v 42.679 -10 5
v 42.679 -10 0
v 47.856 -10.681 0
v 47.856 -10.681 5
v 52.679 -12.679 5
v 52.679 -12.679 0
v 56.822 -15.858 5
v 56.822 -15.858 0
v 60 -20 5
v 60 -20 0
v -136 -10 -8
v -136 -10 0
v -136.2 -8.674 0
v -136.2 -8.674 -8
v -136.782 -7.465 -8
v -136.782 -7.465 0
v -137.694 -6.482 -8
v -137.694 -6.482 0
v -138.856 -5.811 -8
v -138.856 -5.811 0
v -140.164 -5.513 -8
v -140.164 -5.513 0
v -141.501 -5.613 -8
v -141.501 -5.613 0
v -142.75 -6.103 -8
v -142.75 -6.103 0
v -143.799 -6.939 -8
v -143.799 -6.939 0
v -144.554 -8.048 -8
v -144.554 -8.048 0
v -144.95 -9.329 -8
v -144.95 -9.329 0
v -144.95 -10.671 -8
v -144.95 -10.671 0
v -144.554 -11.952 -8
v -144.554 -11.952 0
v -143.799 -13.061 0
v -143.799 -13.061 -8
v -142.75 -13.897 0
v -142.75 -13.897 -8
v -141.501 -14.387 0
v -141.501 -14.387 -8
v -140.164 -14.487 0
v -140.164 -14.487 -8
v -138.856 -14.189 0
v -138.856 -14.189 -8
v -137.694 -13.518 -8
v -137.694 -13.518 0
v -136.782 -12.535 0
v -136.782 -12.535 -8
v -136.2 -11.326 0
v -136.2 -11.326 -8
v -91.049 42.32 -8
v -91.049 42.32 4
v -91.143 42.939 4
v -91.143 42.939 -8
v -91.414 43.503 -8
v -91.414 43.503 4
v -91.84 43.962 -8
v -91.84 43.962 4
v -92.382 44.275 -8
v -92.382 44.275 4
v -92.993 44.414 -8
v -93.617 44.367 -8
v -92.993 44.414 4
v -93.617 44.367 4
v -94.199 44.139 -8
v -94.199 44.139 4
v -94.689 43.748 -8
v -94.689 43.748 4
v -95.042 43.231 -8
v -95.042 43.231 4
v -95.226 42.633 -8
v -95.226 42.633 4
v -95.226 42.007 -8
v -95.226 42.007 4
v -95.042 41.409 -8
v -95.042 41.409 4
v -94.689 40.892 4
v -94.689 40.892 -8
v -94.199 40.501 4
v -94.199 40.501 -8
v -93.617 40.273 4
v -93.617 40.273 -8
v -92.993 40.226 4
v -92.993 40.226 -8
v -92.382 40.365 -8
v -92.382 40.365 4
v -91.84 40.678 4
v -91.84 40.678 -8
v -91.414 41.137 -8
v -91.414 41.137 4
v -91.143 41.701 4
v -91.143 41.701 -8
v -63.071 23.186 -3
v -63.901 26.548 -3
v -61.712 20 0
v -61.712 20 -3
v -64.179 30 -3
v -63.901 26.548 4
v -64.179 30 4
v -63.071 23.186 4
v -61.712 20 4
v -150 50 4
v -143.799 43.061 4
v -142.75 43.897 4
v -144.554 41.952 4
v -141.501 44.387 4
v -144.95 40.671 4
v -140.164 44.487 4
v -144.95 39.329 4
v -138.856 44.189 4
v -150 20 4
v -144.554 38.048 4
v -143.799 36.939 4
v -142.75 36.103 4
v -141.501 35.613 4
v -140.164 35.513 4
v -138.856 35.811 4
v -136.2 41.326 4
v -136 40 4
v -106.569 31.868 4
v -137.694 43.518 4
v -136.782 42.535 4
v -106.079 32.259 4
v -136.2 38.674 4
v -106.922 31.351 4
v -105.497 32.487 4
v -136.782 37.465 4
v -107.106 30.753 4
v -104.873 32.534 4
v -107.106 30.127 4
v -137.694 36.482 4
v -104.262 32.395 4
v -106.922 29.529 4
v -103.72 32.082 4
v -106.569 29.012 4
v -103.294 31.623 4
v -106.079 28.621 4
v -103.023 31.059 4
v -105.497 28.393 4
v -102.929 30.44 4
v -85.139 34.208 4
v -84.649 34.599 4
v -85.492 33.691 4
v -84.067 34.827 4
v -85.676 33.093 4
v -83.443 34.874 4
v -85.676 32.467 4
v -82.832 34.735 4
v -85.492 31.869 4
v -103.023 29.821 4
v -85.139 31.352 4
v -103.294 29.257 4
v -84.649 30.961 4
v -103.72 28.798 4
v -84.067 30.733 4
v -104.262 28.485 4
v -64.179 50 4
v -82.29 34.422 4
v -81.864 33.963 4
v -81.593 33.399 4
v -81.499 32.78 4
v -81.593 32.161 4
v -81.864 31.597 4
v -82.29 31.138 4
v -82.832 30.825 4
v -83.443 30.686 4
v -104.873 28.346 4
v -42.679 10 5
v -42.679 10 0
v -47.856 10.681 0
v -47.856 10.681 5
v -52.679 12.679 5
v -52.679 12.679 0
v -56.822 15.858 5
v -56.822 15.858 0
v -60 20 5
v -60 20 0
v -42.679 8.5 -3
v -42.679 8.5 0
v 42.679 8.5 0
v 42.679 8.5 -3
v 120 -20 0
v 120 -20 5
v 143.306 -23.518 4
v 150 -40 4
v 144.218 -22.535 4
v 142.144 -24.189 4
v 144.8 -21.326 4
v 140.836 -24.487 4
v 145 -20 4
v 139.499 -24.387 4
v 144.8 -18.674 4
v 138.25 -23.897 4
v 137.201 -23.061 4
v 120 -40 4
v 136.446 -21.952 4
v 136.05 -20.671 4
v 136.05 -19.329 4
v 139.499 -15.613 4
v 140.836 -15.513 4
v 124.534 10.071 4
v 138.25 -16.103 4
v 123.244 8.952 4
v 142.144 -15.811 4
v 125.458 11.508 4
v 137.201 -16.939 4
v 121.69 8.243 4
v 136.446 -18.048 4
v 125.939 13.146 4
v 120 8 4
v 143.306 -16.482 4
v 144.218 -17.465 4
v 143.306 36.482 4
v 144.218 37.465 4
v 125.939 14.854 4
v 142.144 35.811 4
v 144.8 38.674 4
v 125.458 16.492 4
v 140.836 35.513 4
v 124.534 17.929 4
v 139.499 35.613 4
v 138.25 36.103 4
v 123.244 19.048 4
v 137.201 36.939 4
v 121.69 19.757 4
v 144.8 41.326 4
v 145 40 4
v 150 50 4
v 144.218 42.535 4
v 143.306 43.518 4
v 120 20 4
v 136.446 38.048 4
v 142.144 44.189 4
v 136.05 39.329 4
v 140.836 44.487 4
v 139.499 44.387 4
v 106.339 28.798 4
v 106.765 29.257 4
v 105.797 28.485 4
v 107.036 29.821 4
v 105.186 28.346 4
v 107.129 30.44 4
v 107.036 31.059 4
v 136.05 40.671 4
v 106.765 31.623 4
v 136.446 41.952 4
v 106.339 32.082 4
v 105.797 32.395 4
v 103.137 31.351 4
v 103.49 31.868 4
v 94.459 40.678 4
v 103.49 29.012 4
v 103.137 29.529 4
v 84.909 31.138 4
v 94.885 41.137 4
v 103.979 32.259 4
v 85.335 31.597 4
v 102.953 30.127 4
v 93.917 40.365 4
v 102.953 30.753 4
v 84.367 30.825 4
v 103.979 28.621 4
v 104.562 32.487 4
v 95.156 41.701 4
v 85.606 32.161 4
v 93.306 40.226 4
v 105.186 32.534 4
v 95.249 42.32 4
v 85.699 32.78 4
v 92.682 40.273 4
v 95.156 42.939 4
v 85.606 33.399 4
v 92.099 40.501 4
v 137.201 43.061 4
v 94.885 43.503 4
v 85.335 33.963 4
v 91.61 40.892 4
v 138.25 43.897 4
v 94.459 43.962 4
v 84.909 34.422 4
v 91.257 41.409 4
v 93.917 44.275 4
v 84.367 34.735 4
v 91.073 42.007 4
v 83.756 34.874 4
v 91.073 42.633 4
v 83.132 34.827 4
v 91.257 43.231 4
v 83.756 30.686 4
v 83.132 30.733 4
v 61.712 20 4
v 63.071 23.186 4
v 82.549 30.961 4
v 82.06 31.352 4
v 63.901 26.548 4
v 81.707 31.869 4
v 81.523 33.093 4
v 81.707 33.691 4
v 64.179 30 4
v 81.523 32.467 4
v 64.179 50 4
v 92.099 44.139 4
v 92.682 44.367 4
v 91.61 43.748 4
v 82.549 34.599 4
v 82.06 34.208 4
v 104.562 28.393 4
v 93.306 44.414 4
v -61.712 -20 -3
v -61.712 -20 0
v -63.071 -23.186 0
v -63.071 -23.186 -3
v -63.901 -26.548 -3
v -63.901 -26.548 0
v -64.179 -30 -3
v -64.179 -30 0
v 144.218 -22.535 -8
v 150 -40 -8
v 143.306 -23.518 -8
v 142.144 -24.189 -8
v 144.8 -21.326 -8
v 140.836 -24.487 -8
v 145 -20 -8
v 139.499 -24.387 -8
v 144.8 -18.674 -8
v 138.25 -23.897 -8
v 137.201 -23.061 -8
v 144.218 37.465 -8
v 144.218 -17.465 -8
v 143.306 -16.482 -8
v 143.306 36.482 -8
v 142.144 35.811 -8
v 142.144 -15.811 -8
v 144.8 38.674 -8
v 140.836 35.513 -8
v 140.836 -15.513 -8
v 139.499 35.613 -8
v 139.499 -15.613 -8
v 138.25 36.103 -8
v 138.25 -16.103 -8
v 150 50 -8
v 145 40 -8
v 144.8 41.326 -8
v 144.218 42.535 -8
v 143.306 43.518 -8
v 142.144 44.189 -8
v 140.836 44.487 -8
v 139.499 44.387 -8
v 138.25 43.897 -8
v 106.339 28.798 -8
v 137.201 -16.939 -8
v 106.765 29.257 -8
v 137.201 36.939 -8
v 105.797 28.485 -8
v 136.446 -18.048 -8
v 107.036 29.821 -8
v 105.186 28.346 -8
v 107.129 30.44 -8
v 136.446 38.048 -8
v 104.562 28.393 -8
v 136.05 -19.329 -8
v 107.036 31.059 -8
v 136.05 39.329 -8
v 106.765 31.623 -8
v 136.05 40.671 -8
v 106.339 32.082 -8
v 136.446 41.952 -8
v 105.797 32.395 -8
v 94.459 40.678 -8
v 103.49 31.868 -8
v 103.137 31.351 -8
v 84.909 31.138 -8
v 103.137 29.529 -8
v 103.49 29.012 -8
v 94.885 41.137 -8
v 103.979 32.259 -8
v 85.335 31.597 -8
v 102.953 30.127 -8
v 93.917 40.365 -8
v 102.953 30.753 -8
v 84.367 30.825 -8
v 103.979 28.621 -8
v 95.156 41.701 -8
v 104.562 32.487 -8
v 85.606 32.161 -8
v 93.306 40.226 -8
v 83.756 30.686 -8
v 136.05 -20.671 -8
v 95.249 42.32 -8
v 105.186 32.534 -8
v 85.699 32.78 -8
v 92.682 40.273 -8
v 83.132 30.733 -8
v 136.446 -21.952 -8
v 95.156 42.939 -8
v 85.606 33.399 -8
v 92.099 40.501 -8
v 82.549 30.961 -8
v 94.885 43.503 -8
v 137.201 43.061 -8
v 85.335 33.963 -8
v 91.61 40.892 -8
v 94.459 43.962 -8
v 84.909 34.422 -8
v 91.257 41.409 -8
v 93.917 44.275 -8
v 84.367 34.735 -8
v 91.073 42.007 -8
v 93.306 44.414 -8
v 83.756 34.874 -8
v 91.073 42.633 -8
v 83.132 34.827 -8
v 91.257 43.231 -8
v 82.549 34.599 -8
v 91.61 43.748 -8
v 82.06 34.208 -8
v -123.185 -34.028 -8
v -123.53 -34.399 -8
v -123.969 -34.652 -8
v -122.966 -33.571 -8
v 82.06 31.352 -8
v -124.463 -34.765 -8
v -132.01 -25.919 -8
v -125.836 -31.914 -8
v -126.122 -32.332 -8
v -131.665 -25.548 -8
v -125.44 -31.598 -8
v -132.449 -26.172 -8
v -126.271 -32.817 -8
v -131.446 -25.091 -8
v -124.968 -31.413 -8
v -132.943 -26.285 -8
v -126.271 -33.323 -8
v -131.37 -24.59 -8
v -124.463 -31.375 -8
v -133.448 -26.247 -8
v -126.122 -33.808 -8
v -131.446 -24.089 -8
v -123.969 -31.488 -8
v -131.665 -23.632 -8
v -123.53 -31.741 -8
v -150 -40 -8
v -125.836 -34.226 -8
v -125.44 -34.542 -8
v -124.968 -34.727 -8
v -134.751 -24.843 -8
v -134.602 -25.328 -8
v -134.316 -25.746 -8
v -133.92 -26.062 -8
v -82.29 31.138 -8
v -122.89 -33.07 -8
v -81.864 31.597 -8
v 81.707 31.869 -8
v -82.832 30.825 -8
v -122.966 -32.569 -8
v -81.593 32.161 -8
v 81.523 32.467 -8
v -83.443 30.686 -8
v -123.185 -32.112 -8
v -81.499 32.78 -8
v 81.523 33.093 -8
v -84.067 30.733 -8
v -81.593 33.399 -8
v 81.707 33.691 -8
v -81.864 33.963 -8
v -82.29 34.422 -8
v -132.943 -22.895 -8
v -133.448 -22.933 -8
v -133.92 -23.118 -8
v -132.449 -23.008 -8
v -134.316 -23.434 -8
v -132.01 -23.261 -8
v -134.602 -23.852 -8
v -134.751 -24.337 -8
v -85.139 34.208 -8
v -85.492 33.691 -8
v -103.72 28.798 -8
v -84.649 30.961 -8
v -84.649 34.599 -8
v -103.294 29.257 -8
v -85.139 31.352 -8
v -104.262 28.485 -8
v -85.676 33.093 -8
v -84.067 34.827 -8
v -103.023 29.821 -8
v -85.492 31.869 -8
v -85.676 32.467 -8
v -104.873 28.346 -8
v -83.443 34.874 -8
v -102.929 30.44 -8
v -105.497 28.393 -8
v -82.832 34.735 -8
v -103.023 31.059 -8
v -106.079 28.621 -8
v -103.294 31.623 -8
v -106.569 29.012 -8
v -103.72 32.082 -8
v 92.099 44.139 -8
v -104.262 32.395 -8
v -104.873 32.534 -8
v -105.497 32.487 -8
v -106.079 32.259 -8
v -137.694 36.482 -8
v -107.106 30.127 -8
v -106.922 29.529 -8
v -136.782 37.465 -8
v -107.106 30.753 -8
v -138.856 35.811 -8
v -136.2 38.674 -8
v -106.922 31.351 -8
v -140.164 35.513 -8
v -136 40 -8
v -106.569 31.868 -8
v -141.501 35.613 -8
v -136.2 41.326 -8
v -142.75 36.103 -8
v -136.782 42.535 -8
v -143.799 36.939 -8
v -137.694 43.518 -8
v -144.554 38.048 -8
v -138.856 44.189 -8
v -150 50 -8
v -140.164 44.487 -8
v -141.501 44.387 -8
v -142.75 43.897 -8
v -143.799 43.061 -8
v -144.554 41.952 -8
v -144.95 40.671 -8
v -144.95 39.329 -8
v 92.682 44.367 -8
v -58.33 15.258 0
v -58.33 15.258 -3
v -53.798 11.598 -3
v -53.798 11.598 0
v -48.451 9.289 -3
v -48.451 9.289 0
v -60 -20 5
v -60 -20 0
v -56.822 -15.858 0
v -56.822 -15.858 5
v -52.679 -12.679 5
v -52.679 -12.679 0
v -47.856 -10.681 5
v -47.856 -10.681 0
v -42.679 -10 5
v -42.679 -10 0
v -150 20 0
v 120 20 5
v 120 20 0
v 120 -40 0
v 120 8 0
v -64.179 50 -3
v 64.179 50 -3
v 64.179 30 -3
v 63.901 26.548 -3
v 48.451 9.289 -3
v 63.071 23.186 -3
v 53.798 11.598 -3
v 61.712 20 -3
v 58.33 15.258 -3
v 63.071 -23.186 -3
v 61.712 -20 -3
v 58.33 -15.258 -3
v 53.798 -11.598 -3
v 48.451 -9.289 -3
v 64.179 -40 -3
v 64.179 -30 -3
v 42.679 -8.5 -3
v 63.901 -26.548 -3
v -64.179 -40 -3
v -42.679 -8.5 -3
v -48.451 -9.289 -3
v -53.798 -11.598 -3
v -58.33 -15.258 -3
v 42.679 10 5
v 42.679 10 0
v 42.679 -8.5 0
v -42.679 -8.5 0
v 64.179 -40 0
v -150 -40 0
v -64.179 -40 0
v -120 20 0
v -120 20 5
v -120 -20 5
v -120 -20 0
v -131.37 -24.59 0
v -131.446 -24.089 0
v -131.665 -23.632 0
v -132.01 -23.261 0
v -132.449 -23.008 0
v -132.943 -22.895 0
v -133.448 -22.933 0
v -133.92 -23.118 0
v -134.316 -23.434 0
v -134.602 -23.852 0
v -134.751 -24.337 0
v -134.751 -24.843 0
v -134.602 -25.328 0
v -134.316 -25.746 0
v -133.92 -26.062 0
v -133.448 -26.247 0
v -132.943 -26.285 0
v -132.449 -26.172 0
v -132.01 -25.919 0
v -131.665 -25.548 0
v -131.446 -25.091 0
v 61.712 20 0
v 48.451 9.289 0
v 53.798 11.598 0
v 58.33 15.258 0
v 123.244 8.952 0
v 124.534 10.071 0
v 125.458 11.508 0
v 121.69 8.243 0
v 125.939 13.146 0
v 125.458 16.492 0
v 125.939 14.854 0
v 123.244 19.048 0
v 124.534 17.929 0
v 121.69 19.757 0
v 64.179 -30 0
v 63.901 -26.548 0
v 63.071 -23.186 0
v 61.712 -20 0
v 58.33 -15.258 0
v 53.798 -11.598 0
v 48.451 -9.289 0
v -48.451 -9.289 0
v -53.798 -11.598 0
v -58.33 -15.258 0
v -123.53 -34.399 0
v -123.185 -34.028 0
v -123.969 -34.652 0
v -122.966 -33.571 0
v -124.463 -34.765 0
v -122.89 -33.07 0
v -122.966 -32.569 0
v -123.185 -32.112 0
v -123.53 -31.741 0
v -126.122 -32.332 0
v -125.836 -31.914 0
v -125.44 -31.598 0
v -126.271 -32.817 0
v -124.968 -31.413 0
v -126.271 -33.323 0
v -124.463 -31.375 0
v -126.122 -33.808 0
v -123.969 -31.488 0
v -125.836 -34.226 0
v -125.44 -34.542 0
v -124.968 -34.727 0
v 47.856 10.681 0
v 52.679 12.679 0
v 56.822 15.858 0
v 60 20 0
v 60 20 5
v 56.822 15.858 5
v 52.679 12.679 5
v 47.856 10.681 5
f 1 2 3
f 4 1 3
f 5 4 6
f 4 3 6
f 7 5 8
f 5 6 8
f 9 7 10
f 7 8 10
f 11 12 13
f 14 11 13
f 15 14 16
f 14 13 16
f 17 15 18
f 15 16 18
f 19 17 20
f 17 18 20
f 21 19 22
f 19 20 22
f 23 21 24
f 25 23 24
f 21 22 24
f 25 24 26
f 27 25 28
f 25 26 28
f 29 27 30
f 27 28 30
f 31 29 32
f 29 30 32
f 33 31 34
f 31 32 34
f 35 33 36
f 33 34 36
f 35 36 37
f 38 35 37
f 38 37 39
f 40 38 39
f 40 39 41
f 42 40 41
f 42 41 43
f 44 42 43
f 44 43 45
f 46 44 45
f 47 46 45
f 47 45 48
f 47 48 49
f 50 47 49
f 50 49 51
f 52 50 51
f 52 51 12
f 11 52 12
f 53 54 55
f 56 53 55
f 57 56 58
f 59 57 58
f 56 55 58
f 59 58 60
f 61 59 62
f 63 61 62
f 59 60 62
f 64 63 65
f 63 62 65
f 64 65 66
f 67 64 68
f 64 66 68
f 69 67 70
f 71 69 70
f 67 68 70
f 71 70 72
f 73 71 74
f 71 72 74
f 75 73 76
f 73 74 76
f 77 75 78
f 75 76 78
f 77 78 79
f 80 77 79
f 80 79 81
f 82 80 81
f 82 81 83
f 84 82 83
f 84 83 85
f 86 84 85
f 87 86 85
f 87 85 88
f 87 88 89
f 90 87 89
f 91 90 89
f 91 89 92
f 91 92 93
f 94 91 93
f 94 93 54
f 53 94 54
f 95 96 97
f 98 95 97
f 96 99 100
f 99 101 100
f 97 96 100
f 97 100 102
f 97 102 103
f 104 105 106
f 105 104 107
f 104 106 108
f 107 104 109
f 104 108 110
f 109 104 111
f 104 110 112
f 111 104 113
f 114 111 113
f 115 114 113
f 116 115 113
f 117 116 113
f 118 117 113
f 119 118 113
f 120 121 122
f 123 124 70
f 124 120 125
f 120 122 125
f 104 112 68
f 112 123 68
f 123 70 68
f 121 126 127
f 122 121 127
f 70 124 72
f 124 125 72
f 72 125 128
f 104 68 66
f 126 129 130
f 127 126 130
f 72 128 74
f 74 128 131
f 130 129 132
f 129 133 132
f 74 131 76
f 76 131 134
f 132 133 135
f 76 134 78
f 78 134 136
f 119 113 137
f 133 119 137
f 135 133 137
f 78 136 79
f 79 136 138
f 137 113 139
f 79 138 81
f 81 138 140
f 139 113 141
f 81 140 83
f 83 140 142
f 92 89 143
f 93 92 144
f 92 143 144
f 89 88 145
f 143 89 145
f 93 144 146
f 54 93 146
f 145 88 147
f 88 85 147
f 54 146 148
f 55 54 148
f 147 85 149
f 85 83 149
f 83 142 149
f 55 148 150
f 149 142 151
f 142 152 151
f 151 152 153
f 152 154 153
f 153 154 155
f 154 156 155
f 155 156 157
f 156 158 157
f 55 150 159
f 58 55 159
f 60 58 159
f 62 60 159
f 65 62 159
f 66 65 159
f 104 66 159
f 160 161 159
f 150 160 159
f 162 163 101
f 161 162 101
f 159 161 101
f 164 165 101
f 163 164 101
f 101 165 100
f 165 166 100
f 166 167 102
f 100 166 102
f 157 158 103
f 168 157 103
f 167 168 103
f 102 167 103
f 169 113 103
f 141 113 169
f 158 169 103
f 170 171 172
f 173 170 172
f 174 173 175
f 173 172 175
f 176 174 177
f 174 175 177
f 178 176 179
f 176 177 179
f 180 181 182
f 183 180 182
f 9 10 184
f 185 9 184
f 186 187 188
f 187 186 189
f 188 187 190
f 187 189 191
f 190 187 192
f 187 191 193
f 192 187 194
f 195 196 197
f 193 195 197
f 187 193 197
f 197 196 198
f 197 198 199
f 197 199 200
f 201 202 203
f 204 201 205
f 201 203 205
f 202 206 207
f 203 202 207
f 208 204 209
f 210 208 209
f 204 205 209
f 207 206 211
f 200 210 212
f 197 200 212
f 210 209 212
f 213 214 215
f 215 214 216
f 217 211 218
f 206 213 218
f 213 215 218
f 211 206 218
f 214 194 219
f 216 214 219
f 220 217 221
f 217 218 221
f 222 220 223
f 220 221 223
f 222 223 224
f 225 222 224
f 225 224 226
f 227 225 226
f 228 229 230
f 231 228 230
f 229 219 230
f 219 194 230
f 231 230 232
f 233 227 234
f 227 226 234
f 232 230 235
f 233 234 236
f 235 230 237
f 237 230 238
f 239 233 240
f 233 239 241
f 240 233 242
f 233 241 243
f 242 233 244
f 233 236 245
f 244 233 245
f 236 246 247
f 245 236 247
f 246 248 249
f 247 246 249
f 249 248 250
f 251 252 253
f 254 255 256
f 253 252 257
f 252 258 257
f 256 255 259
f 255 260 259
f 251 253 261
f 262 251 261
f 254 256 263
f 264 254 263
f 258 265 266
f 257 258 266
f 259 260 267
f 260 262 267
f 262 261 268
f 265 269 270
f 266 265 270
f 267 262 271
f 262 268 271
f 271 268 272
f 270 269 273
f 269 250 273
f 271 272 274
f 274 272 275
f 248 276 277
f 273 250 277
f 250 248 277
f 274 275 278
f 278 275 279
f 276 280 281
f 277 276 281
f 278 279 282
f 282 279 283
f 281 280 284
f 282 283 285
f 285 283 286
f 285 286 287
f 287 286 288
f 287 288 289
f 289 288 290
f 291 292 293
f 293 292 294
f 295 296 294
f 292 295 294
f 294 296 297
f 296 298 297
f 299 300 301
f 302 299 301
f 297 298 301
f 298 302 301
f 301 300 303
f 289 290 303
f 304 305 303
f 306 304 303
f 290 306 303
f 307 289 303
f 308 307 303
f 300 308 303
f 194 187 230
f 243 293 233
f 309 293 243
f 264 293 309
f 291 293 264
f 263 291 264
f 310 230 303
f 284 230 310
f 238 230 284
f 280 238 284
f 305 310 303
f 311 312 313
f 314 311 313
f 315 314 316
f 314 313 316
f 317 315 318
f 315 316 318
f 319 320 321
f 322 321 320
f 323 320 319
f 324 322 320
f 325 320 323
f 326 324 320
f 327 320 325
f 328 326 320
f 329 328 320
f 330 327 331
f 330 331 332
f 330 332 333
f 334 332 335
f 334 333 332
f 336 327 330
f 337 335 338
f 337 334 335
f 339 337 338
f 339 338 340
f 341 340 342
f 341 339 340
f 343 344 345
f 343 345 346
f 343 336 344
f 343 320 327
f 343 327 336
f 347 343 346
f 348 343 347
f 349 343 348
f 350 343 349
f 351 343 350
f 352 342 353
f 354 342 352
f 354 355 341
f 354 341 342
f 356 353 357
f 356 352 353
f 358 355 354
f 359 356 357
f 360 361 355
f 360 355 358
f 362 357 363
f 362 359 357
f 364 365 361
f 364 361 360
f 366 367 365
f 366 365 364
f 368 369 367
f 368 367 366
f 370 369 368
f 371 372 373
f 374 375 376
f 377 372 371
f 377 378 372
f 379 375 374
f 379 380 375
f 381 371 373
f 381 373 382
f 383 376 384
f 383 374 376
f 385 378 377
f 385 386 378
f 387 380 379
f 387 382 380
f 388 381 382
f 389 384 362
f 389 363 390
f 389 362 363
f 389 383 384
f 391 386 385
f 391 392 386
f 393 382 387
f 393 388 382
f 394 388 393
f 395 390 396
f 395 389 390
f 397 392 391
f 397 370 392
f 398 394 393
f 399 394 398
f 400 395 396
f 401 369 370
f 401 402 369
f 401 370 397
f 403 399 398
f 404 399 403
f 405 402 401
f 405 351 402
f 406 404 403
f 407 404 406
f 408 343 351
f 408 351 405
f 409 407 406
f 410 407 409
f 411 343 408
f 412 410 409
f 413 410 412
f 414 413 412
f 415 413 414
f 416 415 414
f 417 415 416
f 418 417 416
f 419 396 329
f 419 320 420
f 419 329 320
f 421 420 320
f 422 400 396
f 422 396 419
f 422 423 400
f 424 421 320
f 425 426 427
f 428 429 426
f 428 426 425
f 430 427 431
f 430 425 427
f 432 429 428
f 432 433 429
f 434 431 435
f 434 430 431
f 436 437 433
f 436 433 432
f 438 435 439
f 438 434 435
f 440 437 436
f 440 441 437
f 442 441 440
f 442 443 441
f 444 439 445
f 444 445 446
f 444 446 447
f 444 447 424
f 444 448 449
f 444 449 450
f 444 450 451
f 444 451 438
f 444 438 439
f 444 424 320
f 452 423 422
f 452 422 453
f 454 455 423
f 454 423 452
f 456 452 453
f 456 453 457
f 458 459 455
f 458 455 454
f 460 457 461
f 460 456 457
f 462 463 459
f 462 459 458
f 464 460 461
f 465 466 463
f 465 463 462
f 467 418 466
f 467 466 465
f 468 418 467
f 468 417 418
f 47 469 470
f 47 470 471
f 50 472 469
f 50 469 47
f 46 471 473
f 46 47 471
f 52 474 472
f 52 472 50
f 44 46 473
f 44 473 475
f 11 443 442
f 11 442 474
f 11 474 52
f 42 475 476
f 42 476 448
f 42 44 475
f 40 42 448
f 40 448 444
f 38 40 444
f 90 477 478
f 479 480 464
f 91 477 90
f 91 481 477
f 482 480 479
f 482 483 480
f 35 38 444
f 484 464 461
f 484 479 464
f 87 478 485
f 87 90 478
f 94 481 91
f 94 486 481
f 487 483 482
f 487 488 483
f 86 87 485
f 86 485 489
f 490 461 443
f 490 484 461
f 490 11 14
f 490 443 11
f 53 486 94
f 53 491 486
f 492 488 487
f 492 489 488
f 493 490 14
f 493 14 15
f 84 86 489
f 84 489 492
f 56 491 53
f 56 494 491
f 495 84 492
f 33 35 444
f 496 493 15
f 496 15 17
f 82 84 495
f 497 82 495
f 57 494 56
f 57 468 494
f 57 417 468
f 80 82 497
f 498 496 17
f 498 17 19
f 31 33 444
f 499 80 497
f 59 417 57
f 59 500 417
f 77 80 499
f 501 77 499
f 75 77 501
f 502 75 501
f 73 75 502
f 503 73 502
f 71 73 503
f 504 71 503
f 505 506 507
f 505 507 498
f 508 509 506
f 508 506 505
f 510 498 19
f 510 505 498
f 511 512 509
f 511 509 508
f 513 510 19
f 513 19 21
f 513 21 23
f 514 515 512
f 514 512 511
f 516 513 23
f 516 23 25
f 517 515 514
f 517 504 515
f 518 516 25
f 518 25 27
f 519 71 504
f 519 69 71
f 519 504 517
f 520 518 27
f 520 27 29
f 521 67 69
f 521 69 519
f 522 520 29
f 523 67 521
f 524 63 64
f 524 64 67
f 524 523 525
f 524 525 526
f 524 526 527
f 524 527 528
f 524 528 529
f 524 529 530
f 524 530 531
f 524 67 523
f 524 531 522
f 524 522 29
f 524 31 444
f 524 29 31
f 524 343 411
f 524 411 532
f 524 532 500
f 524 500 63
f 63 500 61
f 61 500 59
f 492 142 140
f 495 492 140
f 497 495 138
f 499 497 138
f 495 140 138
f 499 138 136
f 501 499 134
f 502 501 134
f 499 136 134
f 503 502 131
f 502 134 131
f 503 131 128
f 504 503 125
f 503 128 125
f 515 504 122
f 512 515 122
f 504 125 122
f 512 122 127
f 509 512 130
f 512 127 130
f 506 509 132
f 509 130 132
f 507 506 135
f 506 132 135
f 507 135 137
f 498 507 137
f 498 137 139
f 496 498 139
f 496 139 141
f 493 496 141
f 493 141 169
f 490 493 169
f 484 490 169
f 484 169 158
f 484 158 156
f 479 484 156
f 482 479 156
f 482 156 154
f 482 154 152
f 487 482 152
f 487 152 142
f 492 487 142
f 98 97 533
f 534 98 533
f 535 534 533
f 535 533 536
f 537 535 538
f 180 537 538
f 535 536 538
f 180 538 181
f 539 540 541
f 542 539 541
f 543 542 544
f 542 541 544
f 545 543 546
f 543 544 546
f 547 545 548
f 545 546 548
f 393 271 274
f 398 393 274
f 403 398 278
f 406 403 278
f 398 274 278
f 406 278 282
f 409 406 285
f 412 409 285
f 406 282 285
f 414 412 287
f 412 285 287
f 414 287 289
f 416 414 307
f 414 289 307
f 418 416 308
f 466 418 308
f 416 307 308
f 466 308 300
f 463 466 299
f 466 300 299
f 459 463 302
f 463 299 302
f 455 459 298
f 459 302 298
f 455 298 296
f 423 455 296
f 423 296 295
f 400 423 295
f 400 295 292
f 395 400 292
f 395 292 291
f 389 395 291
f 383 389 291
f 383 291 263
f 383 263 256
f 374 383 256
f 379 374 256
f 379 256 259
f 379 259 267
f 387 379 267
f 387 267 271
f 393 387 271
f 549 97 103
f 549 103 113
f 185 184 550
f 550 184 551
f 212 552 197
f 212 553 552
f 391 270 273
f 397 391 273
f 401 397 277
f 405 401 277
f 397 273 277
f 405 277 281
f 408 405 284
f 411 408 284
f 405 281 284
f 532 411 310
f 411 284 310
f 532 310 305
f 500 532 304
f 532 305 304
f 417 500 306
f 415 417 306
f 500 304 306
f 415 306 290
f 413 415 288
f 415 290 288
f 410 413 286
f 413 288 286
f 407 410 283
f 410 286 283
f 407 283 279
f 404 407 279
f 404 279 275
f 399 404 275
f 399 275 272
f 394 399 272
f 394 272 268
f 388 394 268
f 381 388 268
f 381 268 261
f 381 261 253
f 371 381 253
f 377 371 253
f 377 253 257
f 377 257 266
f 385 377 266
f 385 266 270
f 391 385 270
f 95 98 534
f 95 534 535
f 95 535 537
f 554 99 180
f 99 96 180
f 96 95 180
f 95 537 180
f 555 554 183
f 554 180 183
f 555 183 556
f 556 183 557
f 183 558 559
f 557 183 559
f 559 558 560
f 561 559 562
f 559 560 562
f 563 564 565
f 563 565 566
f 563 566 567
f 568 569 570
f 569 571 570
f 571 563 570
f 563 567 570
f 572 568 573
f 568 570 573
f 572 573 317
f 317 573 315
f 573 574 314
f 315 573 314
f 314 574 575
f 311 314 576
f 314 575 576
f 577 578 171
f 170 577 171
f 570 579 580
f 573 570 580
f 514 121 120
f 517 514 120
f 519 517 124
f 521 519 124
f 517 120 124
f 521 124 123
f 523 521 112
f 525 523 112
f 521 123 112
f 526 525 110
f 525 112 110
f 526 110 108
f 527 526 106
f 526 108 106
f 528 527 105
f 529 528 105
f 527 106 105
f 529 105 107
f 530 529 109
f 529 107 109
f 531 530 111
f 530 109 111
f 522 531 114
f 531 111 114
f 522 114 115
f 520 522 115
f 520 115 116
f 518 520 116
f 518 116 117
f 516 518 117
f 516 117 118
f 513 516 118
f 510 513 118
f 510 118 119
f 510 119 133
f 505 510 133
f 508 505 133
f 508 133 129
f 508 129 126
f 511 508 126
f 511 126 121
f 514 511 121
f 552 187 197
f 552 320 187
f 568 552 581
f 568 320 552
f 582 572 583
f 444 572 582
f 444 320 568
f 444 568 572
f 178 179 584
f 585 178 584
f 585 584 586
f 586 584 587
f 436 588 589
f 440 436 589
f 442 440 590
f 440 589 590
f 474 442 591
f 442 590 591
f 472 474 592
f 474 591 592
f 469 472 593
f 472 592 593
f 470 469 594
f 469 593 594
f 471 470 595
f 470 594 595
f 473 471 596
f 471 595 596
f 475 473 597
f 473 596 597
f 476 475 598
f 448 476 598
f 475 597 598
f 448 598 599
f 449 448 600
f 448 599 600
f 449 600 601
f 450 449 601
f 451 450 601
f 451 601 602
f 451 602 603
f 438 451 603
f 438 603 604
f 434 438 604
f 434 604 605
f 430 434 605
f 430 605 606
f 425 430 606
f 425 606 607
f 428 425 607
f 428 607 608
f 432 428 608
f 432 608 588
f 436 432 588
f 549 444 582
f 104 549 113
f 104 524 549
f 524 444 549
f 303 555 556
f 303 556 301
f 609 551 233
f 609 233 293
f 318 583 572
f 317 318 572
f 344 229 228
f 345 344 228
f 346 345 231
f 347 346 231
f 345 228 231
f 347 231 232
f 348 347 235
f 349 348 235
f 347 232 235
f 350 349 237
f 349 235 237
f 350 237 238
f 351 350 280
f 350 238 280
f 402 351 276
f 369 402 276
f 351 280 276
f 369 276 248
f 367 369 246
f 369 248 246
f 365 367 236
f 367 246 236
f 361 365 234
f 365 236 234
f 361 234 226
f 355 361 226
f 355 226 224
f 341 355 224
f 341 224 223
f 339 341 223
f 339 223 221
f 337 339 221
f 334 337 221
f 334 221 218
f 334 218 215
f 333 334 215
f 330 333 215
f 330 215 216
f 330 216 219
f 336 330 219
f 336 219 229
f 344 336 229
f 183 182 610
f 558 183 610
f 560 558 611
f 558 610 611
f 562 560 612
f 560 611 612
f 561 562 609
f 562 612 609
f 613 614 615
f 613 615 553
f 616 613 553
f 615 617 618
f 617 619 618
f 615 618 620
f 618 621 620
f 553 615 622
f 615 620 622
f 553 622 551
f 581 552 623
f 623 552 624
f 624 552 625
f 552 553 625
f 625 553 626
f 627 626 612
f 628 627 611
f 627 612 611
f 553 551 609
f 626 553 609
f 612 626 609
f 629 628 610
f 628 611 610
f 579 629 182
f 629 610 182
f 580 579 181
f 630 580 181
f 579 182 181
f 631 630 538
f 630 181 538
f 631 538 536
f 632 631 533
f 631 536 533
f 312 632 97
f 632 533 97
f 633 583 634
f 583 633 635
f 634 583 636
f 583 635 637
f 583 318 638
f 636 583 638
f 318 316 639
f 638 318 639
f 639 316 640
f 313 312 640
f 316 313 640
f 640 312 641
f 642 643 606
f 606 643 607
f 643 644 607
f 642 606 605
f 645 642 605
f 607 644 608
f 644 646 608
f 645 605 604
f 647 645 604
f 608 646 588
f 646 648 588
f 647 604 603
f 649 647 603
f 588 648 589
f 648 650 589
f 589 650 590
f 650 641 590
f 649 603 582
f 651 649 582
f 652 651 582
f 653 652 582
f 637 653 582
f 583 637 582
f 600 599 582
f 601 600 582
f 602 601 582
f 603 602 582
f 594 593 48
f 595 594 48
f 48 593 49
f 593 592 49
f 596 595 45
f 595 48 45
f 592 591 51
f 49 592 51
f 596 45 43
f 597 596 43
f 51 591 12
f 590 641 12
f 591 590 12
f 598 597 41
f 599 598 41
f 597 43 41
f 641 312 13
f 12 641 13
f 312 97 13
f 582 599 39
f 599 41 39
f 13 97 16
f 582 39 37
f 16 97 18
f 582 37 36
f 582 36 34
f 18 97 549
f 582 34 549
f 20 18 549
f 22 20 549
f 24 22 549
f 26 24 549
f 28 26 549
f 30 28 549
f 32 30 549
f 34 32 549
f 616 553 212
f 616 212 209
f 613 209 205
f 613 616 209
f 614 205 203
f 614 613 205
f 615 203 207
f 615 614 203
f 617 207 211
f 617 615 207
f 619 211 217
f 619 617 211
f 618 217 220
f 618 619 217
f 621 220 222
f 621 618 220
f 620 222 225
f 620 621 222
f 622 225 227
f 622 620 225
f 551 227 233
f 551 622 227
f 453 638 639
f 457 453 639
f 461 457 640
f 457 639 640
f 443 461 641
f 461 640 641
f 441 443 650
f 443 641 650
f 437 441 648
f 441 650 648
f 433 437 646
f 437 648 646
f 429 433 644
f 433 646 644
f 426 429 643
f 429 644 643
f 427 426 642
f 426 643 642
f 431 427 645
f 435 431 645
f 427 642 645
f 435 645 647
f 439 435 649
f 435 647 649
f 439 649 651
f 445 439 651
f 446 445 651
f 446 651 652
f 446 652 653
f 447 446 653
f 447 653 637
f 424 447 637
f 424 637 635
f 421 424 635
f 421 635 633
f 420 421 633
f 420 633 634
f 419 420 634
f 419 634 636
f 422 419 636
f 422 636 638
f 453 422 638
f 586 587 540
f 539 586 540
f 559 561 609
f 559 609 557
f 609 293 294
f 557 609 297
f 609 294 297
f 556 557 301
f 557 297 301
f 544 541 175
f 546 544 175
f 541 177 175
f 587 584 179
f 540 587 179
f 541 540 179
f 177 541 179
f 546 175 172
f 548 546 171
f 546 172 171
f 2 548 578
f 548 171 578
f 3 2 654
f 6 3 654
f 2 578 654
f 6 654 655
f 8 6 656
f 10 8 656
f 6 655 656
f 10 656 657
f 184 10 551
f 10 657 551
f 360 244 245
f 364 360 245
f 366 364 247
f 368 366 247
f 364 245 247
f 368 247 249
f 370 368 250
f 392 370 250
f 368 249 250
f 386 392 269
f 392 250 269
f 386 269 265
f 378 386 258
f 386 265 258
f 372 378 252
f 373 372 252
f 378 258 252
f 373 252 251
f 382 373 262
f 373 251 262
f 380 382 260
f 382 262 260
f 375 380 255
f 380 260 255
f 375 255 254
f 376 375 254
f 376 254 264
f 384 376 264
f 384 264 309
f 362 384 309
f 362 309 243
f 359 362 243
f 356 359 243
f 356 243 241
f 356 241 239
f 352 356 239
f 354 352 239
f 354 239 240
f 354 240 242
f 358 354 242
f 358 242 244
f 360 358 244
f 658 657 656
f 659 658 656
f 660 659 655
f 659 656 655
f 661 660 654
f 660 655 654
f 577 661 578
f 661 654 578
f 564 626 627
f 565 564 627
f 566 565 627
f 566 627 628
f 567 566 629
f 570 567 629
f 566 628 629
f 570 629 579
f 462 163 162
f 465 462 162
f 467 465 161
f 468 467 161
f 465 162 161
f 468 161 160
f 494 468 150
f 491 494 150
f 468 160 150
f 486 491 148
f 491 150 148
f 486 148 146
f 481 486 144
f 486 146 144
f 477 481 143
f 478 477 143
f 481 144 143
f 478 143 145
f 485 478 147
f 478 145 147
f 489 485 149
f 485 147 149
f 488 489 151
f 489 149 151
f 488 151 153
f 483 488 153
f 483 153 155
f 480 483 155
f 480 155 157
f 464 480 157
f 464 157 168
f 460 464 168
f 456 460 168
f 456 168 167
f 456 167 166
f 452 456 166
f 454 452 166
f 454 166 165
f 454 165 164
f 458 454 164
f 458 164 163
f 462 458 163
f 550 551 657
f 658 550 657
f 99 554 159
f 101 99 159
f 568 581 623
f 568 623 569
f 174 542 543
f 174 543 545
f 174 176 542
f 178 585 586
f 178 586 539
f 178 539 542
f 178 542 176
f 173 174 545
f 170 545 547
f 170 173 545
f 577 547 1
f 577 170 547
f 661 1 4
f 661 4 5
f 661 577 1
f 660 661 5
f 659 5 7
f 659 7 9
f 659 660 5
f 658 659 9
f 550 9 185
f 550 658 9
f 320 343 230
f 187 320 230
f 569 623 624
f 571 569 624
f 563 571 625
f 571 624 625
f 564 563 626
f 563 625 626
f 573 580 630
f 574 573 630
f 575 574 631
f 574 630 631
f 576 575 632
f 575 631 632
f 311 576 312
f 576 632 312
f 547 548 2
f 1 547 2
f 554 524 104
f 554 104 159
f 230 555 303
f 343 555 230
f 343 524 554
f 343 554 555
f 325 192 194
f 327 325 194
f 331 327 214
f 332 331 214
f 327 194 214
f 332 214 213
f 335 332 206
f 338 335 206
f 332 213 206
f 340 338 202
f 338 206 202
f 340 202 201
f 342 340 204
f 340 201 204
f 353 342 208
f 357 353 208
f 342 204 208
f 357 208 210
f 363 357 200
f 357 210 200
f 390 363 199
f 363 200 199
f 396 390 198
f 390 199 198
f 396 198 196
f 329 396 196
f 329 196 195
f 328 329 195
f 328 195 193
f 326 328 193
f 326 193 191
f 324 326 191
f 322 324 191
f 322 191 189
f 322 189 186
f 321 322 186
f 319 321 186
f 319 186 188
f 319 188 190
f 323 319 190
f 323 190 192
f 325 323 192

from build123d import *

# Parameters (mm, degrees)
F1_DEPTH  = 5
F3_DEPTH  = 3
F4_W      = 20
F4_H      = 60
F5_DEPTH  = 5
F6_DEPTH  = 4
F7_DEPTH  = 20
F8_R      = 2.1
F9_DEPTH  = 25
F10_R     = 4.5
F11_DEPTH = 25
F13_DEPTH = 10
F12_R     = 1.7
F14_DEPTH = 25


# Not quite as in the source:
# - a feature names something its author has since deleted; it is built from what else it names


with BuildPart() as f1:
    # F0 (on Top) → F1 (new body)
    with BuildSketch(Plane.XY):
        with BuildLine():
            Line((0, -10), (0, 0))
            Line((0, 0), (120, 0))
            Line((120, 0), (120, 20))
            Line((120, 20), (60, 20))
            ThreePointArc((60, 20), (52.6794919243, 12.6794919243), (42.6794919243, 10))
            Line((42.6794919243, 10), (0, 10))
            Line((0, 10), (-42.6794919243, 10))
            ThreePointArc((-42.6794919243, 10), (-52.6794919243, 12.6794919243), (-60, 20))
            Line((-60, 20), (-120, 20))
            Line((-120, 20), (-120, 0))
            Line((-120, 0), (-120, -20))
            Line((-120, -20), (-60, -20))
            ThreePointArc((-60, -20), (-52.6794919243, -12.6794919243), (-42.6794919243, -10))
            Line((-42.6794919243, -10), (0, -10))
        make_face()
        with BuildLine():
            Line((120, 0), (0, 0))
            Line((0, 0), (0, -10))
            Line((0, -10), (42.6794919243, -10))
            ThreePointArc((42.6794919243, -10), (52.6794919243, -12.6794919243), (60, -20))
            Line((60, -20), (120, -20))
            Line((120, -20), (120, 0))
        make_face()
    extrude(amount=F1_DEPTH)


with BuildPart() as f3:
    # F2 (on face) → F3 (new body)
    with BuildSketch(Plane(origin=(0, 0, 0), x_dir=(1, 0, 0), z_dir=(0, 0, -1))):
        with BuildLine():
            Line((120, 30), (64.1794919243, 30))
            ThreePointArc((64.1794919243, 30), (63.5535982007, 24.8500789171), (61.712358235, 20))
            Line((61.712358235, 20), (120, 20))
            Line((120, 20), (120, 30))
        make_face()
        with BuildLine():
            Line((120, 20), (61.712358235, 20))
            ThreePointArc((61.712358235, 20), (53.7981699033, 11.5982337804), (42.6794919243, 8.5))
            Line((42.6794919243, 8.5), (-42.6794919243, 8.5))
            ThreePointArc((-42.6794919243, 8.5), (-53.7981699033, 11.5982337804), (-61.712358235, 20))
            Line((-61.712358235, 20), (-120, 20))
            Line((-120, 20), (-120, -20))
            Line((-120, -20), (-61.712358235, -20))
            ThreePointArc((-61.712358235, -20), (-53.7981699033, -11.5982337804), (-42.6794919243, -8.5))
            Line((-42.6794919243, -8.5), (42.6794919243, -8.5))
            ThreePointArc((42.6794919243, -8.5), (53.7981699033, -11.5982337804), (61.712358235, -20))
            Line((61.712358235, -20), (120, -20))
            Line((120, -20), (120, -8))
            Line((120, -8), (120, 20))
        make_face()
        with BuildLine():
            ThreePointArc((-61.712358235, 20), (-63.5535982007, 24.8500789171), (-64.1794919243, 30))
            Line((-64.1794919243, 30), (-150, 30))
            Line((-150, 30), (-150, -20))
            Line((-150, -20), (-120, -20))
            Line((-120, -20), (-120, 20))
            Line((-120, 20), (-61.712358235, 20))
        make_face()
        with BuildLine():
            Line((-120, -20), (-150, -20))
            Line((-150, -20), (-150, -30))
            Line((-150, -30), (-64.1794919243, -30))
            ThreePointArc((-64.1794919243, -30), (-63.5535982007, -24.8500789171), (-61.712358235, -20))
            Line((-61.712358235, -20), (-120, -20))
        make_face()
        with BuildLine():
            Line((150, 30), (120, 30))
            Line((120, 30), (120, 20))
            Line((120, 20), (120, -8))
            ThreePointArc((120, -8), (126, -14), (120, -20))
            Line((120, -20), (61.712358235, -20))
            ThreePointArc((61.712358235, -20), (63.5535982007, -24.8500789171), (64.1794919243, -30))
            Line((64.1794919243, -30), (150, -30))
            Line((150, -30), (150, 30))
        make_face()
        with BuildLine():
            ThreePointArc((120, -20), (126, -14), (120, -8))
            Line((120, -8), (120, -20))
        make_face()
    extrude(amount=F3_DEPTH)

    # F4 (on face) → F5 (join)
    with BuildSketch(Plane(origin=(0, 0, -3), x_dir=(1, 0, 0), z_dir=(0, 0, -1))):
        with BuildLine():
            Line((64.1794919243, -30), (130, -30))
            Line((130, -30), (130, 30))
            Line((130, 30), (64.1794919243, 30))
            ThreePointArc((64.1794919243, 30), (57.8822877198, 14.7972042045), (42.6794919243, 8.5))
            Line((42.6794919243, 8.5), (-42.6794919243, 8.5))
            ThreePointArc((-42.6794919243, 8.5), (-57.8822877198, 14.7972042045), (-64.1794919243, 30))
            Line((-64.1794919243, 30), (-130, 30))
            Line((-130, 30), (-130, -30))
            Line((-130, -30), (-64.1794919243, -30))
            ThreePointArc((-64.1794919243, -30), (-57.8822877198, -14.7972042045), (-42.6794919243, -8.5))
            Line((-42.6794919243, -8.5), (42.6794919243, -8.5))
            ThreePointArc((42.6794919243, -8.5), (57.8822877198, -14.7972042045), (64.1794919243, -30))
        make_face()
        with BuildLine():
            ThreePointArc((42.6794919243, 8.5), (57.8822877198, 14.7972042045), (64.1794919243, 30))
            Line((64.1794919243, 30), (-64.1794919243, 30))
            ThreePointArc((-64.1794919243, 30), (-57.8822877198, 14.7972042045), (-42.6794919243, 8.5))
            Line((-42.6794919243, 8.5), (42.6794919243, 8.5))
        make_face()
        with BuildLine():
            Line((-64.1794919243, -30), (64.1794919243, -30))
            ThreePointArc((64.1794919243, -30), (57.8822877198, -14.7972042045), (42.6794919243, -8.5))
            Line((42.6794919243, -8.5), (-42.6794919243, -8.5))
            ThreePointArc((-42.6794919243, -8.5), (-57.8822877198, -14.7972042045), (-64.1794919243, -30))
        make_face()
        with Locations((-140, 0)):
            Rectangle(F4_W, F4_H)
        with Locations((140, 0)):
            Rectangle(F4_W, F4_H)
    extrude(amount=F5_DEPTH)

    # F2 (on face) → F6 (join)
    with BuildSketch(Plane(origin=(0, 0, 0), x_dir=(1, 0, 0), z_dir=(0, 0, -1))):
        with BuildLine():
            Line((150, 30), (120, 30))
            Line((120, 30), (120, 20))
            Line((120, 20), (120, -8))
            ThreePointArc((120, -8), (126, -14), (120, -20))
            Line((120, -20), (61.712358235, -20))
            ThreePointArc((61.712358235, -20), (63.5535982007, -24.8500789171), (64.1794919243, -30))
            Line((64.1794919243, -30), (150, -30))
            Line((150, -30), (150, 30))
        make_face()
        with BuildLine():
            Line((-120, -20), (-150, -20))
            Line((-150, -20), (-150, -30))
            Line((-150, -30), (-64.1794919243, -30))
            ThreePointArc((-64.1794919243, -30), (-63.5535982007, -24.8500789171), (-61.712358235, -20))
            Line((-61.712358235, -20), (-120, -20))
        make_face()
    extrude(amount=-F6_DEPTH)

    # F7 (add): a face of the model
    f7_faces = [f3.faces().sort_by_distance(p)[0] for p in [
        (67.1818909651, 30, 0.5),
    ]]
    extrude(f7_faces, amount=F7_DEPTH)

    # F8 (on face) → F9 (cut)
    with BuildSketch(Plane.XY.offset(4)):
        with Locations((-105.0294919243, 30.44)):
            Circle(F8_R)
        with Locations((-93.1494919243, 42.32)):
            Circle(F8_R)
        with Locations((-83.5994919243, 32.78)):
            Circle(F8_R)
        with Locations((83.5994919243, 32.78)):
            Circle(F8_R)
        with Locations((93.1494919243, 42.32)):
            Circle(F8_R)
        with Locations((105.0294919243, 30.44)):
            Circle(F8_R)
    extrude(amount=-F9_DEPTH, mode=Mode.SUBTRACT)

    # F10 (on face) → F11 (cut)
    with BuildSketch(Plane.XY.offset(5)):
        with Locations((-140.5, -10)):
            Circle(F10_R)
        with Locations((140.5, -20)):
            Circle(F10_R)
        with Locations((-140.5, 40)):
            Circle(F10_R)
        with Locations((140.5, 40)):
            Circle(F10_R)
    extrude(amount=-F11_DEPTH, mode=Mode.SUBTRACT)

    # F13 (add): a face of the model
    f13_faces = [f3.faces().sort_by_distance(p)[0] for p in [
        (7.5880955109, -30, -4.1136773426),
    ]]
    extrude(f13_faces, amount=F13_DEPTH)

    # F12 (on face) → F14 (cut)
    with BuildSketch(Plane.XY):
        with Locations((-124.59, -33.07)):
            Circle(F12_R)
        with Locations((-133.07, -24.59)):
            Circle(F12_R)
    extrude(amount=-F14_DEPTH, mode=Mode.SUBTRACT)


solid = Compound([f1.part, f3.part])
